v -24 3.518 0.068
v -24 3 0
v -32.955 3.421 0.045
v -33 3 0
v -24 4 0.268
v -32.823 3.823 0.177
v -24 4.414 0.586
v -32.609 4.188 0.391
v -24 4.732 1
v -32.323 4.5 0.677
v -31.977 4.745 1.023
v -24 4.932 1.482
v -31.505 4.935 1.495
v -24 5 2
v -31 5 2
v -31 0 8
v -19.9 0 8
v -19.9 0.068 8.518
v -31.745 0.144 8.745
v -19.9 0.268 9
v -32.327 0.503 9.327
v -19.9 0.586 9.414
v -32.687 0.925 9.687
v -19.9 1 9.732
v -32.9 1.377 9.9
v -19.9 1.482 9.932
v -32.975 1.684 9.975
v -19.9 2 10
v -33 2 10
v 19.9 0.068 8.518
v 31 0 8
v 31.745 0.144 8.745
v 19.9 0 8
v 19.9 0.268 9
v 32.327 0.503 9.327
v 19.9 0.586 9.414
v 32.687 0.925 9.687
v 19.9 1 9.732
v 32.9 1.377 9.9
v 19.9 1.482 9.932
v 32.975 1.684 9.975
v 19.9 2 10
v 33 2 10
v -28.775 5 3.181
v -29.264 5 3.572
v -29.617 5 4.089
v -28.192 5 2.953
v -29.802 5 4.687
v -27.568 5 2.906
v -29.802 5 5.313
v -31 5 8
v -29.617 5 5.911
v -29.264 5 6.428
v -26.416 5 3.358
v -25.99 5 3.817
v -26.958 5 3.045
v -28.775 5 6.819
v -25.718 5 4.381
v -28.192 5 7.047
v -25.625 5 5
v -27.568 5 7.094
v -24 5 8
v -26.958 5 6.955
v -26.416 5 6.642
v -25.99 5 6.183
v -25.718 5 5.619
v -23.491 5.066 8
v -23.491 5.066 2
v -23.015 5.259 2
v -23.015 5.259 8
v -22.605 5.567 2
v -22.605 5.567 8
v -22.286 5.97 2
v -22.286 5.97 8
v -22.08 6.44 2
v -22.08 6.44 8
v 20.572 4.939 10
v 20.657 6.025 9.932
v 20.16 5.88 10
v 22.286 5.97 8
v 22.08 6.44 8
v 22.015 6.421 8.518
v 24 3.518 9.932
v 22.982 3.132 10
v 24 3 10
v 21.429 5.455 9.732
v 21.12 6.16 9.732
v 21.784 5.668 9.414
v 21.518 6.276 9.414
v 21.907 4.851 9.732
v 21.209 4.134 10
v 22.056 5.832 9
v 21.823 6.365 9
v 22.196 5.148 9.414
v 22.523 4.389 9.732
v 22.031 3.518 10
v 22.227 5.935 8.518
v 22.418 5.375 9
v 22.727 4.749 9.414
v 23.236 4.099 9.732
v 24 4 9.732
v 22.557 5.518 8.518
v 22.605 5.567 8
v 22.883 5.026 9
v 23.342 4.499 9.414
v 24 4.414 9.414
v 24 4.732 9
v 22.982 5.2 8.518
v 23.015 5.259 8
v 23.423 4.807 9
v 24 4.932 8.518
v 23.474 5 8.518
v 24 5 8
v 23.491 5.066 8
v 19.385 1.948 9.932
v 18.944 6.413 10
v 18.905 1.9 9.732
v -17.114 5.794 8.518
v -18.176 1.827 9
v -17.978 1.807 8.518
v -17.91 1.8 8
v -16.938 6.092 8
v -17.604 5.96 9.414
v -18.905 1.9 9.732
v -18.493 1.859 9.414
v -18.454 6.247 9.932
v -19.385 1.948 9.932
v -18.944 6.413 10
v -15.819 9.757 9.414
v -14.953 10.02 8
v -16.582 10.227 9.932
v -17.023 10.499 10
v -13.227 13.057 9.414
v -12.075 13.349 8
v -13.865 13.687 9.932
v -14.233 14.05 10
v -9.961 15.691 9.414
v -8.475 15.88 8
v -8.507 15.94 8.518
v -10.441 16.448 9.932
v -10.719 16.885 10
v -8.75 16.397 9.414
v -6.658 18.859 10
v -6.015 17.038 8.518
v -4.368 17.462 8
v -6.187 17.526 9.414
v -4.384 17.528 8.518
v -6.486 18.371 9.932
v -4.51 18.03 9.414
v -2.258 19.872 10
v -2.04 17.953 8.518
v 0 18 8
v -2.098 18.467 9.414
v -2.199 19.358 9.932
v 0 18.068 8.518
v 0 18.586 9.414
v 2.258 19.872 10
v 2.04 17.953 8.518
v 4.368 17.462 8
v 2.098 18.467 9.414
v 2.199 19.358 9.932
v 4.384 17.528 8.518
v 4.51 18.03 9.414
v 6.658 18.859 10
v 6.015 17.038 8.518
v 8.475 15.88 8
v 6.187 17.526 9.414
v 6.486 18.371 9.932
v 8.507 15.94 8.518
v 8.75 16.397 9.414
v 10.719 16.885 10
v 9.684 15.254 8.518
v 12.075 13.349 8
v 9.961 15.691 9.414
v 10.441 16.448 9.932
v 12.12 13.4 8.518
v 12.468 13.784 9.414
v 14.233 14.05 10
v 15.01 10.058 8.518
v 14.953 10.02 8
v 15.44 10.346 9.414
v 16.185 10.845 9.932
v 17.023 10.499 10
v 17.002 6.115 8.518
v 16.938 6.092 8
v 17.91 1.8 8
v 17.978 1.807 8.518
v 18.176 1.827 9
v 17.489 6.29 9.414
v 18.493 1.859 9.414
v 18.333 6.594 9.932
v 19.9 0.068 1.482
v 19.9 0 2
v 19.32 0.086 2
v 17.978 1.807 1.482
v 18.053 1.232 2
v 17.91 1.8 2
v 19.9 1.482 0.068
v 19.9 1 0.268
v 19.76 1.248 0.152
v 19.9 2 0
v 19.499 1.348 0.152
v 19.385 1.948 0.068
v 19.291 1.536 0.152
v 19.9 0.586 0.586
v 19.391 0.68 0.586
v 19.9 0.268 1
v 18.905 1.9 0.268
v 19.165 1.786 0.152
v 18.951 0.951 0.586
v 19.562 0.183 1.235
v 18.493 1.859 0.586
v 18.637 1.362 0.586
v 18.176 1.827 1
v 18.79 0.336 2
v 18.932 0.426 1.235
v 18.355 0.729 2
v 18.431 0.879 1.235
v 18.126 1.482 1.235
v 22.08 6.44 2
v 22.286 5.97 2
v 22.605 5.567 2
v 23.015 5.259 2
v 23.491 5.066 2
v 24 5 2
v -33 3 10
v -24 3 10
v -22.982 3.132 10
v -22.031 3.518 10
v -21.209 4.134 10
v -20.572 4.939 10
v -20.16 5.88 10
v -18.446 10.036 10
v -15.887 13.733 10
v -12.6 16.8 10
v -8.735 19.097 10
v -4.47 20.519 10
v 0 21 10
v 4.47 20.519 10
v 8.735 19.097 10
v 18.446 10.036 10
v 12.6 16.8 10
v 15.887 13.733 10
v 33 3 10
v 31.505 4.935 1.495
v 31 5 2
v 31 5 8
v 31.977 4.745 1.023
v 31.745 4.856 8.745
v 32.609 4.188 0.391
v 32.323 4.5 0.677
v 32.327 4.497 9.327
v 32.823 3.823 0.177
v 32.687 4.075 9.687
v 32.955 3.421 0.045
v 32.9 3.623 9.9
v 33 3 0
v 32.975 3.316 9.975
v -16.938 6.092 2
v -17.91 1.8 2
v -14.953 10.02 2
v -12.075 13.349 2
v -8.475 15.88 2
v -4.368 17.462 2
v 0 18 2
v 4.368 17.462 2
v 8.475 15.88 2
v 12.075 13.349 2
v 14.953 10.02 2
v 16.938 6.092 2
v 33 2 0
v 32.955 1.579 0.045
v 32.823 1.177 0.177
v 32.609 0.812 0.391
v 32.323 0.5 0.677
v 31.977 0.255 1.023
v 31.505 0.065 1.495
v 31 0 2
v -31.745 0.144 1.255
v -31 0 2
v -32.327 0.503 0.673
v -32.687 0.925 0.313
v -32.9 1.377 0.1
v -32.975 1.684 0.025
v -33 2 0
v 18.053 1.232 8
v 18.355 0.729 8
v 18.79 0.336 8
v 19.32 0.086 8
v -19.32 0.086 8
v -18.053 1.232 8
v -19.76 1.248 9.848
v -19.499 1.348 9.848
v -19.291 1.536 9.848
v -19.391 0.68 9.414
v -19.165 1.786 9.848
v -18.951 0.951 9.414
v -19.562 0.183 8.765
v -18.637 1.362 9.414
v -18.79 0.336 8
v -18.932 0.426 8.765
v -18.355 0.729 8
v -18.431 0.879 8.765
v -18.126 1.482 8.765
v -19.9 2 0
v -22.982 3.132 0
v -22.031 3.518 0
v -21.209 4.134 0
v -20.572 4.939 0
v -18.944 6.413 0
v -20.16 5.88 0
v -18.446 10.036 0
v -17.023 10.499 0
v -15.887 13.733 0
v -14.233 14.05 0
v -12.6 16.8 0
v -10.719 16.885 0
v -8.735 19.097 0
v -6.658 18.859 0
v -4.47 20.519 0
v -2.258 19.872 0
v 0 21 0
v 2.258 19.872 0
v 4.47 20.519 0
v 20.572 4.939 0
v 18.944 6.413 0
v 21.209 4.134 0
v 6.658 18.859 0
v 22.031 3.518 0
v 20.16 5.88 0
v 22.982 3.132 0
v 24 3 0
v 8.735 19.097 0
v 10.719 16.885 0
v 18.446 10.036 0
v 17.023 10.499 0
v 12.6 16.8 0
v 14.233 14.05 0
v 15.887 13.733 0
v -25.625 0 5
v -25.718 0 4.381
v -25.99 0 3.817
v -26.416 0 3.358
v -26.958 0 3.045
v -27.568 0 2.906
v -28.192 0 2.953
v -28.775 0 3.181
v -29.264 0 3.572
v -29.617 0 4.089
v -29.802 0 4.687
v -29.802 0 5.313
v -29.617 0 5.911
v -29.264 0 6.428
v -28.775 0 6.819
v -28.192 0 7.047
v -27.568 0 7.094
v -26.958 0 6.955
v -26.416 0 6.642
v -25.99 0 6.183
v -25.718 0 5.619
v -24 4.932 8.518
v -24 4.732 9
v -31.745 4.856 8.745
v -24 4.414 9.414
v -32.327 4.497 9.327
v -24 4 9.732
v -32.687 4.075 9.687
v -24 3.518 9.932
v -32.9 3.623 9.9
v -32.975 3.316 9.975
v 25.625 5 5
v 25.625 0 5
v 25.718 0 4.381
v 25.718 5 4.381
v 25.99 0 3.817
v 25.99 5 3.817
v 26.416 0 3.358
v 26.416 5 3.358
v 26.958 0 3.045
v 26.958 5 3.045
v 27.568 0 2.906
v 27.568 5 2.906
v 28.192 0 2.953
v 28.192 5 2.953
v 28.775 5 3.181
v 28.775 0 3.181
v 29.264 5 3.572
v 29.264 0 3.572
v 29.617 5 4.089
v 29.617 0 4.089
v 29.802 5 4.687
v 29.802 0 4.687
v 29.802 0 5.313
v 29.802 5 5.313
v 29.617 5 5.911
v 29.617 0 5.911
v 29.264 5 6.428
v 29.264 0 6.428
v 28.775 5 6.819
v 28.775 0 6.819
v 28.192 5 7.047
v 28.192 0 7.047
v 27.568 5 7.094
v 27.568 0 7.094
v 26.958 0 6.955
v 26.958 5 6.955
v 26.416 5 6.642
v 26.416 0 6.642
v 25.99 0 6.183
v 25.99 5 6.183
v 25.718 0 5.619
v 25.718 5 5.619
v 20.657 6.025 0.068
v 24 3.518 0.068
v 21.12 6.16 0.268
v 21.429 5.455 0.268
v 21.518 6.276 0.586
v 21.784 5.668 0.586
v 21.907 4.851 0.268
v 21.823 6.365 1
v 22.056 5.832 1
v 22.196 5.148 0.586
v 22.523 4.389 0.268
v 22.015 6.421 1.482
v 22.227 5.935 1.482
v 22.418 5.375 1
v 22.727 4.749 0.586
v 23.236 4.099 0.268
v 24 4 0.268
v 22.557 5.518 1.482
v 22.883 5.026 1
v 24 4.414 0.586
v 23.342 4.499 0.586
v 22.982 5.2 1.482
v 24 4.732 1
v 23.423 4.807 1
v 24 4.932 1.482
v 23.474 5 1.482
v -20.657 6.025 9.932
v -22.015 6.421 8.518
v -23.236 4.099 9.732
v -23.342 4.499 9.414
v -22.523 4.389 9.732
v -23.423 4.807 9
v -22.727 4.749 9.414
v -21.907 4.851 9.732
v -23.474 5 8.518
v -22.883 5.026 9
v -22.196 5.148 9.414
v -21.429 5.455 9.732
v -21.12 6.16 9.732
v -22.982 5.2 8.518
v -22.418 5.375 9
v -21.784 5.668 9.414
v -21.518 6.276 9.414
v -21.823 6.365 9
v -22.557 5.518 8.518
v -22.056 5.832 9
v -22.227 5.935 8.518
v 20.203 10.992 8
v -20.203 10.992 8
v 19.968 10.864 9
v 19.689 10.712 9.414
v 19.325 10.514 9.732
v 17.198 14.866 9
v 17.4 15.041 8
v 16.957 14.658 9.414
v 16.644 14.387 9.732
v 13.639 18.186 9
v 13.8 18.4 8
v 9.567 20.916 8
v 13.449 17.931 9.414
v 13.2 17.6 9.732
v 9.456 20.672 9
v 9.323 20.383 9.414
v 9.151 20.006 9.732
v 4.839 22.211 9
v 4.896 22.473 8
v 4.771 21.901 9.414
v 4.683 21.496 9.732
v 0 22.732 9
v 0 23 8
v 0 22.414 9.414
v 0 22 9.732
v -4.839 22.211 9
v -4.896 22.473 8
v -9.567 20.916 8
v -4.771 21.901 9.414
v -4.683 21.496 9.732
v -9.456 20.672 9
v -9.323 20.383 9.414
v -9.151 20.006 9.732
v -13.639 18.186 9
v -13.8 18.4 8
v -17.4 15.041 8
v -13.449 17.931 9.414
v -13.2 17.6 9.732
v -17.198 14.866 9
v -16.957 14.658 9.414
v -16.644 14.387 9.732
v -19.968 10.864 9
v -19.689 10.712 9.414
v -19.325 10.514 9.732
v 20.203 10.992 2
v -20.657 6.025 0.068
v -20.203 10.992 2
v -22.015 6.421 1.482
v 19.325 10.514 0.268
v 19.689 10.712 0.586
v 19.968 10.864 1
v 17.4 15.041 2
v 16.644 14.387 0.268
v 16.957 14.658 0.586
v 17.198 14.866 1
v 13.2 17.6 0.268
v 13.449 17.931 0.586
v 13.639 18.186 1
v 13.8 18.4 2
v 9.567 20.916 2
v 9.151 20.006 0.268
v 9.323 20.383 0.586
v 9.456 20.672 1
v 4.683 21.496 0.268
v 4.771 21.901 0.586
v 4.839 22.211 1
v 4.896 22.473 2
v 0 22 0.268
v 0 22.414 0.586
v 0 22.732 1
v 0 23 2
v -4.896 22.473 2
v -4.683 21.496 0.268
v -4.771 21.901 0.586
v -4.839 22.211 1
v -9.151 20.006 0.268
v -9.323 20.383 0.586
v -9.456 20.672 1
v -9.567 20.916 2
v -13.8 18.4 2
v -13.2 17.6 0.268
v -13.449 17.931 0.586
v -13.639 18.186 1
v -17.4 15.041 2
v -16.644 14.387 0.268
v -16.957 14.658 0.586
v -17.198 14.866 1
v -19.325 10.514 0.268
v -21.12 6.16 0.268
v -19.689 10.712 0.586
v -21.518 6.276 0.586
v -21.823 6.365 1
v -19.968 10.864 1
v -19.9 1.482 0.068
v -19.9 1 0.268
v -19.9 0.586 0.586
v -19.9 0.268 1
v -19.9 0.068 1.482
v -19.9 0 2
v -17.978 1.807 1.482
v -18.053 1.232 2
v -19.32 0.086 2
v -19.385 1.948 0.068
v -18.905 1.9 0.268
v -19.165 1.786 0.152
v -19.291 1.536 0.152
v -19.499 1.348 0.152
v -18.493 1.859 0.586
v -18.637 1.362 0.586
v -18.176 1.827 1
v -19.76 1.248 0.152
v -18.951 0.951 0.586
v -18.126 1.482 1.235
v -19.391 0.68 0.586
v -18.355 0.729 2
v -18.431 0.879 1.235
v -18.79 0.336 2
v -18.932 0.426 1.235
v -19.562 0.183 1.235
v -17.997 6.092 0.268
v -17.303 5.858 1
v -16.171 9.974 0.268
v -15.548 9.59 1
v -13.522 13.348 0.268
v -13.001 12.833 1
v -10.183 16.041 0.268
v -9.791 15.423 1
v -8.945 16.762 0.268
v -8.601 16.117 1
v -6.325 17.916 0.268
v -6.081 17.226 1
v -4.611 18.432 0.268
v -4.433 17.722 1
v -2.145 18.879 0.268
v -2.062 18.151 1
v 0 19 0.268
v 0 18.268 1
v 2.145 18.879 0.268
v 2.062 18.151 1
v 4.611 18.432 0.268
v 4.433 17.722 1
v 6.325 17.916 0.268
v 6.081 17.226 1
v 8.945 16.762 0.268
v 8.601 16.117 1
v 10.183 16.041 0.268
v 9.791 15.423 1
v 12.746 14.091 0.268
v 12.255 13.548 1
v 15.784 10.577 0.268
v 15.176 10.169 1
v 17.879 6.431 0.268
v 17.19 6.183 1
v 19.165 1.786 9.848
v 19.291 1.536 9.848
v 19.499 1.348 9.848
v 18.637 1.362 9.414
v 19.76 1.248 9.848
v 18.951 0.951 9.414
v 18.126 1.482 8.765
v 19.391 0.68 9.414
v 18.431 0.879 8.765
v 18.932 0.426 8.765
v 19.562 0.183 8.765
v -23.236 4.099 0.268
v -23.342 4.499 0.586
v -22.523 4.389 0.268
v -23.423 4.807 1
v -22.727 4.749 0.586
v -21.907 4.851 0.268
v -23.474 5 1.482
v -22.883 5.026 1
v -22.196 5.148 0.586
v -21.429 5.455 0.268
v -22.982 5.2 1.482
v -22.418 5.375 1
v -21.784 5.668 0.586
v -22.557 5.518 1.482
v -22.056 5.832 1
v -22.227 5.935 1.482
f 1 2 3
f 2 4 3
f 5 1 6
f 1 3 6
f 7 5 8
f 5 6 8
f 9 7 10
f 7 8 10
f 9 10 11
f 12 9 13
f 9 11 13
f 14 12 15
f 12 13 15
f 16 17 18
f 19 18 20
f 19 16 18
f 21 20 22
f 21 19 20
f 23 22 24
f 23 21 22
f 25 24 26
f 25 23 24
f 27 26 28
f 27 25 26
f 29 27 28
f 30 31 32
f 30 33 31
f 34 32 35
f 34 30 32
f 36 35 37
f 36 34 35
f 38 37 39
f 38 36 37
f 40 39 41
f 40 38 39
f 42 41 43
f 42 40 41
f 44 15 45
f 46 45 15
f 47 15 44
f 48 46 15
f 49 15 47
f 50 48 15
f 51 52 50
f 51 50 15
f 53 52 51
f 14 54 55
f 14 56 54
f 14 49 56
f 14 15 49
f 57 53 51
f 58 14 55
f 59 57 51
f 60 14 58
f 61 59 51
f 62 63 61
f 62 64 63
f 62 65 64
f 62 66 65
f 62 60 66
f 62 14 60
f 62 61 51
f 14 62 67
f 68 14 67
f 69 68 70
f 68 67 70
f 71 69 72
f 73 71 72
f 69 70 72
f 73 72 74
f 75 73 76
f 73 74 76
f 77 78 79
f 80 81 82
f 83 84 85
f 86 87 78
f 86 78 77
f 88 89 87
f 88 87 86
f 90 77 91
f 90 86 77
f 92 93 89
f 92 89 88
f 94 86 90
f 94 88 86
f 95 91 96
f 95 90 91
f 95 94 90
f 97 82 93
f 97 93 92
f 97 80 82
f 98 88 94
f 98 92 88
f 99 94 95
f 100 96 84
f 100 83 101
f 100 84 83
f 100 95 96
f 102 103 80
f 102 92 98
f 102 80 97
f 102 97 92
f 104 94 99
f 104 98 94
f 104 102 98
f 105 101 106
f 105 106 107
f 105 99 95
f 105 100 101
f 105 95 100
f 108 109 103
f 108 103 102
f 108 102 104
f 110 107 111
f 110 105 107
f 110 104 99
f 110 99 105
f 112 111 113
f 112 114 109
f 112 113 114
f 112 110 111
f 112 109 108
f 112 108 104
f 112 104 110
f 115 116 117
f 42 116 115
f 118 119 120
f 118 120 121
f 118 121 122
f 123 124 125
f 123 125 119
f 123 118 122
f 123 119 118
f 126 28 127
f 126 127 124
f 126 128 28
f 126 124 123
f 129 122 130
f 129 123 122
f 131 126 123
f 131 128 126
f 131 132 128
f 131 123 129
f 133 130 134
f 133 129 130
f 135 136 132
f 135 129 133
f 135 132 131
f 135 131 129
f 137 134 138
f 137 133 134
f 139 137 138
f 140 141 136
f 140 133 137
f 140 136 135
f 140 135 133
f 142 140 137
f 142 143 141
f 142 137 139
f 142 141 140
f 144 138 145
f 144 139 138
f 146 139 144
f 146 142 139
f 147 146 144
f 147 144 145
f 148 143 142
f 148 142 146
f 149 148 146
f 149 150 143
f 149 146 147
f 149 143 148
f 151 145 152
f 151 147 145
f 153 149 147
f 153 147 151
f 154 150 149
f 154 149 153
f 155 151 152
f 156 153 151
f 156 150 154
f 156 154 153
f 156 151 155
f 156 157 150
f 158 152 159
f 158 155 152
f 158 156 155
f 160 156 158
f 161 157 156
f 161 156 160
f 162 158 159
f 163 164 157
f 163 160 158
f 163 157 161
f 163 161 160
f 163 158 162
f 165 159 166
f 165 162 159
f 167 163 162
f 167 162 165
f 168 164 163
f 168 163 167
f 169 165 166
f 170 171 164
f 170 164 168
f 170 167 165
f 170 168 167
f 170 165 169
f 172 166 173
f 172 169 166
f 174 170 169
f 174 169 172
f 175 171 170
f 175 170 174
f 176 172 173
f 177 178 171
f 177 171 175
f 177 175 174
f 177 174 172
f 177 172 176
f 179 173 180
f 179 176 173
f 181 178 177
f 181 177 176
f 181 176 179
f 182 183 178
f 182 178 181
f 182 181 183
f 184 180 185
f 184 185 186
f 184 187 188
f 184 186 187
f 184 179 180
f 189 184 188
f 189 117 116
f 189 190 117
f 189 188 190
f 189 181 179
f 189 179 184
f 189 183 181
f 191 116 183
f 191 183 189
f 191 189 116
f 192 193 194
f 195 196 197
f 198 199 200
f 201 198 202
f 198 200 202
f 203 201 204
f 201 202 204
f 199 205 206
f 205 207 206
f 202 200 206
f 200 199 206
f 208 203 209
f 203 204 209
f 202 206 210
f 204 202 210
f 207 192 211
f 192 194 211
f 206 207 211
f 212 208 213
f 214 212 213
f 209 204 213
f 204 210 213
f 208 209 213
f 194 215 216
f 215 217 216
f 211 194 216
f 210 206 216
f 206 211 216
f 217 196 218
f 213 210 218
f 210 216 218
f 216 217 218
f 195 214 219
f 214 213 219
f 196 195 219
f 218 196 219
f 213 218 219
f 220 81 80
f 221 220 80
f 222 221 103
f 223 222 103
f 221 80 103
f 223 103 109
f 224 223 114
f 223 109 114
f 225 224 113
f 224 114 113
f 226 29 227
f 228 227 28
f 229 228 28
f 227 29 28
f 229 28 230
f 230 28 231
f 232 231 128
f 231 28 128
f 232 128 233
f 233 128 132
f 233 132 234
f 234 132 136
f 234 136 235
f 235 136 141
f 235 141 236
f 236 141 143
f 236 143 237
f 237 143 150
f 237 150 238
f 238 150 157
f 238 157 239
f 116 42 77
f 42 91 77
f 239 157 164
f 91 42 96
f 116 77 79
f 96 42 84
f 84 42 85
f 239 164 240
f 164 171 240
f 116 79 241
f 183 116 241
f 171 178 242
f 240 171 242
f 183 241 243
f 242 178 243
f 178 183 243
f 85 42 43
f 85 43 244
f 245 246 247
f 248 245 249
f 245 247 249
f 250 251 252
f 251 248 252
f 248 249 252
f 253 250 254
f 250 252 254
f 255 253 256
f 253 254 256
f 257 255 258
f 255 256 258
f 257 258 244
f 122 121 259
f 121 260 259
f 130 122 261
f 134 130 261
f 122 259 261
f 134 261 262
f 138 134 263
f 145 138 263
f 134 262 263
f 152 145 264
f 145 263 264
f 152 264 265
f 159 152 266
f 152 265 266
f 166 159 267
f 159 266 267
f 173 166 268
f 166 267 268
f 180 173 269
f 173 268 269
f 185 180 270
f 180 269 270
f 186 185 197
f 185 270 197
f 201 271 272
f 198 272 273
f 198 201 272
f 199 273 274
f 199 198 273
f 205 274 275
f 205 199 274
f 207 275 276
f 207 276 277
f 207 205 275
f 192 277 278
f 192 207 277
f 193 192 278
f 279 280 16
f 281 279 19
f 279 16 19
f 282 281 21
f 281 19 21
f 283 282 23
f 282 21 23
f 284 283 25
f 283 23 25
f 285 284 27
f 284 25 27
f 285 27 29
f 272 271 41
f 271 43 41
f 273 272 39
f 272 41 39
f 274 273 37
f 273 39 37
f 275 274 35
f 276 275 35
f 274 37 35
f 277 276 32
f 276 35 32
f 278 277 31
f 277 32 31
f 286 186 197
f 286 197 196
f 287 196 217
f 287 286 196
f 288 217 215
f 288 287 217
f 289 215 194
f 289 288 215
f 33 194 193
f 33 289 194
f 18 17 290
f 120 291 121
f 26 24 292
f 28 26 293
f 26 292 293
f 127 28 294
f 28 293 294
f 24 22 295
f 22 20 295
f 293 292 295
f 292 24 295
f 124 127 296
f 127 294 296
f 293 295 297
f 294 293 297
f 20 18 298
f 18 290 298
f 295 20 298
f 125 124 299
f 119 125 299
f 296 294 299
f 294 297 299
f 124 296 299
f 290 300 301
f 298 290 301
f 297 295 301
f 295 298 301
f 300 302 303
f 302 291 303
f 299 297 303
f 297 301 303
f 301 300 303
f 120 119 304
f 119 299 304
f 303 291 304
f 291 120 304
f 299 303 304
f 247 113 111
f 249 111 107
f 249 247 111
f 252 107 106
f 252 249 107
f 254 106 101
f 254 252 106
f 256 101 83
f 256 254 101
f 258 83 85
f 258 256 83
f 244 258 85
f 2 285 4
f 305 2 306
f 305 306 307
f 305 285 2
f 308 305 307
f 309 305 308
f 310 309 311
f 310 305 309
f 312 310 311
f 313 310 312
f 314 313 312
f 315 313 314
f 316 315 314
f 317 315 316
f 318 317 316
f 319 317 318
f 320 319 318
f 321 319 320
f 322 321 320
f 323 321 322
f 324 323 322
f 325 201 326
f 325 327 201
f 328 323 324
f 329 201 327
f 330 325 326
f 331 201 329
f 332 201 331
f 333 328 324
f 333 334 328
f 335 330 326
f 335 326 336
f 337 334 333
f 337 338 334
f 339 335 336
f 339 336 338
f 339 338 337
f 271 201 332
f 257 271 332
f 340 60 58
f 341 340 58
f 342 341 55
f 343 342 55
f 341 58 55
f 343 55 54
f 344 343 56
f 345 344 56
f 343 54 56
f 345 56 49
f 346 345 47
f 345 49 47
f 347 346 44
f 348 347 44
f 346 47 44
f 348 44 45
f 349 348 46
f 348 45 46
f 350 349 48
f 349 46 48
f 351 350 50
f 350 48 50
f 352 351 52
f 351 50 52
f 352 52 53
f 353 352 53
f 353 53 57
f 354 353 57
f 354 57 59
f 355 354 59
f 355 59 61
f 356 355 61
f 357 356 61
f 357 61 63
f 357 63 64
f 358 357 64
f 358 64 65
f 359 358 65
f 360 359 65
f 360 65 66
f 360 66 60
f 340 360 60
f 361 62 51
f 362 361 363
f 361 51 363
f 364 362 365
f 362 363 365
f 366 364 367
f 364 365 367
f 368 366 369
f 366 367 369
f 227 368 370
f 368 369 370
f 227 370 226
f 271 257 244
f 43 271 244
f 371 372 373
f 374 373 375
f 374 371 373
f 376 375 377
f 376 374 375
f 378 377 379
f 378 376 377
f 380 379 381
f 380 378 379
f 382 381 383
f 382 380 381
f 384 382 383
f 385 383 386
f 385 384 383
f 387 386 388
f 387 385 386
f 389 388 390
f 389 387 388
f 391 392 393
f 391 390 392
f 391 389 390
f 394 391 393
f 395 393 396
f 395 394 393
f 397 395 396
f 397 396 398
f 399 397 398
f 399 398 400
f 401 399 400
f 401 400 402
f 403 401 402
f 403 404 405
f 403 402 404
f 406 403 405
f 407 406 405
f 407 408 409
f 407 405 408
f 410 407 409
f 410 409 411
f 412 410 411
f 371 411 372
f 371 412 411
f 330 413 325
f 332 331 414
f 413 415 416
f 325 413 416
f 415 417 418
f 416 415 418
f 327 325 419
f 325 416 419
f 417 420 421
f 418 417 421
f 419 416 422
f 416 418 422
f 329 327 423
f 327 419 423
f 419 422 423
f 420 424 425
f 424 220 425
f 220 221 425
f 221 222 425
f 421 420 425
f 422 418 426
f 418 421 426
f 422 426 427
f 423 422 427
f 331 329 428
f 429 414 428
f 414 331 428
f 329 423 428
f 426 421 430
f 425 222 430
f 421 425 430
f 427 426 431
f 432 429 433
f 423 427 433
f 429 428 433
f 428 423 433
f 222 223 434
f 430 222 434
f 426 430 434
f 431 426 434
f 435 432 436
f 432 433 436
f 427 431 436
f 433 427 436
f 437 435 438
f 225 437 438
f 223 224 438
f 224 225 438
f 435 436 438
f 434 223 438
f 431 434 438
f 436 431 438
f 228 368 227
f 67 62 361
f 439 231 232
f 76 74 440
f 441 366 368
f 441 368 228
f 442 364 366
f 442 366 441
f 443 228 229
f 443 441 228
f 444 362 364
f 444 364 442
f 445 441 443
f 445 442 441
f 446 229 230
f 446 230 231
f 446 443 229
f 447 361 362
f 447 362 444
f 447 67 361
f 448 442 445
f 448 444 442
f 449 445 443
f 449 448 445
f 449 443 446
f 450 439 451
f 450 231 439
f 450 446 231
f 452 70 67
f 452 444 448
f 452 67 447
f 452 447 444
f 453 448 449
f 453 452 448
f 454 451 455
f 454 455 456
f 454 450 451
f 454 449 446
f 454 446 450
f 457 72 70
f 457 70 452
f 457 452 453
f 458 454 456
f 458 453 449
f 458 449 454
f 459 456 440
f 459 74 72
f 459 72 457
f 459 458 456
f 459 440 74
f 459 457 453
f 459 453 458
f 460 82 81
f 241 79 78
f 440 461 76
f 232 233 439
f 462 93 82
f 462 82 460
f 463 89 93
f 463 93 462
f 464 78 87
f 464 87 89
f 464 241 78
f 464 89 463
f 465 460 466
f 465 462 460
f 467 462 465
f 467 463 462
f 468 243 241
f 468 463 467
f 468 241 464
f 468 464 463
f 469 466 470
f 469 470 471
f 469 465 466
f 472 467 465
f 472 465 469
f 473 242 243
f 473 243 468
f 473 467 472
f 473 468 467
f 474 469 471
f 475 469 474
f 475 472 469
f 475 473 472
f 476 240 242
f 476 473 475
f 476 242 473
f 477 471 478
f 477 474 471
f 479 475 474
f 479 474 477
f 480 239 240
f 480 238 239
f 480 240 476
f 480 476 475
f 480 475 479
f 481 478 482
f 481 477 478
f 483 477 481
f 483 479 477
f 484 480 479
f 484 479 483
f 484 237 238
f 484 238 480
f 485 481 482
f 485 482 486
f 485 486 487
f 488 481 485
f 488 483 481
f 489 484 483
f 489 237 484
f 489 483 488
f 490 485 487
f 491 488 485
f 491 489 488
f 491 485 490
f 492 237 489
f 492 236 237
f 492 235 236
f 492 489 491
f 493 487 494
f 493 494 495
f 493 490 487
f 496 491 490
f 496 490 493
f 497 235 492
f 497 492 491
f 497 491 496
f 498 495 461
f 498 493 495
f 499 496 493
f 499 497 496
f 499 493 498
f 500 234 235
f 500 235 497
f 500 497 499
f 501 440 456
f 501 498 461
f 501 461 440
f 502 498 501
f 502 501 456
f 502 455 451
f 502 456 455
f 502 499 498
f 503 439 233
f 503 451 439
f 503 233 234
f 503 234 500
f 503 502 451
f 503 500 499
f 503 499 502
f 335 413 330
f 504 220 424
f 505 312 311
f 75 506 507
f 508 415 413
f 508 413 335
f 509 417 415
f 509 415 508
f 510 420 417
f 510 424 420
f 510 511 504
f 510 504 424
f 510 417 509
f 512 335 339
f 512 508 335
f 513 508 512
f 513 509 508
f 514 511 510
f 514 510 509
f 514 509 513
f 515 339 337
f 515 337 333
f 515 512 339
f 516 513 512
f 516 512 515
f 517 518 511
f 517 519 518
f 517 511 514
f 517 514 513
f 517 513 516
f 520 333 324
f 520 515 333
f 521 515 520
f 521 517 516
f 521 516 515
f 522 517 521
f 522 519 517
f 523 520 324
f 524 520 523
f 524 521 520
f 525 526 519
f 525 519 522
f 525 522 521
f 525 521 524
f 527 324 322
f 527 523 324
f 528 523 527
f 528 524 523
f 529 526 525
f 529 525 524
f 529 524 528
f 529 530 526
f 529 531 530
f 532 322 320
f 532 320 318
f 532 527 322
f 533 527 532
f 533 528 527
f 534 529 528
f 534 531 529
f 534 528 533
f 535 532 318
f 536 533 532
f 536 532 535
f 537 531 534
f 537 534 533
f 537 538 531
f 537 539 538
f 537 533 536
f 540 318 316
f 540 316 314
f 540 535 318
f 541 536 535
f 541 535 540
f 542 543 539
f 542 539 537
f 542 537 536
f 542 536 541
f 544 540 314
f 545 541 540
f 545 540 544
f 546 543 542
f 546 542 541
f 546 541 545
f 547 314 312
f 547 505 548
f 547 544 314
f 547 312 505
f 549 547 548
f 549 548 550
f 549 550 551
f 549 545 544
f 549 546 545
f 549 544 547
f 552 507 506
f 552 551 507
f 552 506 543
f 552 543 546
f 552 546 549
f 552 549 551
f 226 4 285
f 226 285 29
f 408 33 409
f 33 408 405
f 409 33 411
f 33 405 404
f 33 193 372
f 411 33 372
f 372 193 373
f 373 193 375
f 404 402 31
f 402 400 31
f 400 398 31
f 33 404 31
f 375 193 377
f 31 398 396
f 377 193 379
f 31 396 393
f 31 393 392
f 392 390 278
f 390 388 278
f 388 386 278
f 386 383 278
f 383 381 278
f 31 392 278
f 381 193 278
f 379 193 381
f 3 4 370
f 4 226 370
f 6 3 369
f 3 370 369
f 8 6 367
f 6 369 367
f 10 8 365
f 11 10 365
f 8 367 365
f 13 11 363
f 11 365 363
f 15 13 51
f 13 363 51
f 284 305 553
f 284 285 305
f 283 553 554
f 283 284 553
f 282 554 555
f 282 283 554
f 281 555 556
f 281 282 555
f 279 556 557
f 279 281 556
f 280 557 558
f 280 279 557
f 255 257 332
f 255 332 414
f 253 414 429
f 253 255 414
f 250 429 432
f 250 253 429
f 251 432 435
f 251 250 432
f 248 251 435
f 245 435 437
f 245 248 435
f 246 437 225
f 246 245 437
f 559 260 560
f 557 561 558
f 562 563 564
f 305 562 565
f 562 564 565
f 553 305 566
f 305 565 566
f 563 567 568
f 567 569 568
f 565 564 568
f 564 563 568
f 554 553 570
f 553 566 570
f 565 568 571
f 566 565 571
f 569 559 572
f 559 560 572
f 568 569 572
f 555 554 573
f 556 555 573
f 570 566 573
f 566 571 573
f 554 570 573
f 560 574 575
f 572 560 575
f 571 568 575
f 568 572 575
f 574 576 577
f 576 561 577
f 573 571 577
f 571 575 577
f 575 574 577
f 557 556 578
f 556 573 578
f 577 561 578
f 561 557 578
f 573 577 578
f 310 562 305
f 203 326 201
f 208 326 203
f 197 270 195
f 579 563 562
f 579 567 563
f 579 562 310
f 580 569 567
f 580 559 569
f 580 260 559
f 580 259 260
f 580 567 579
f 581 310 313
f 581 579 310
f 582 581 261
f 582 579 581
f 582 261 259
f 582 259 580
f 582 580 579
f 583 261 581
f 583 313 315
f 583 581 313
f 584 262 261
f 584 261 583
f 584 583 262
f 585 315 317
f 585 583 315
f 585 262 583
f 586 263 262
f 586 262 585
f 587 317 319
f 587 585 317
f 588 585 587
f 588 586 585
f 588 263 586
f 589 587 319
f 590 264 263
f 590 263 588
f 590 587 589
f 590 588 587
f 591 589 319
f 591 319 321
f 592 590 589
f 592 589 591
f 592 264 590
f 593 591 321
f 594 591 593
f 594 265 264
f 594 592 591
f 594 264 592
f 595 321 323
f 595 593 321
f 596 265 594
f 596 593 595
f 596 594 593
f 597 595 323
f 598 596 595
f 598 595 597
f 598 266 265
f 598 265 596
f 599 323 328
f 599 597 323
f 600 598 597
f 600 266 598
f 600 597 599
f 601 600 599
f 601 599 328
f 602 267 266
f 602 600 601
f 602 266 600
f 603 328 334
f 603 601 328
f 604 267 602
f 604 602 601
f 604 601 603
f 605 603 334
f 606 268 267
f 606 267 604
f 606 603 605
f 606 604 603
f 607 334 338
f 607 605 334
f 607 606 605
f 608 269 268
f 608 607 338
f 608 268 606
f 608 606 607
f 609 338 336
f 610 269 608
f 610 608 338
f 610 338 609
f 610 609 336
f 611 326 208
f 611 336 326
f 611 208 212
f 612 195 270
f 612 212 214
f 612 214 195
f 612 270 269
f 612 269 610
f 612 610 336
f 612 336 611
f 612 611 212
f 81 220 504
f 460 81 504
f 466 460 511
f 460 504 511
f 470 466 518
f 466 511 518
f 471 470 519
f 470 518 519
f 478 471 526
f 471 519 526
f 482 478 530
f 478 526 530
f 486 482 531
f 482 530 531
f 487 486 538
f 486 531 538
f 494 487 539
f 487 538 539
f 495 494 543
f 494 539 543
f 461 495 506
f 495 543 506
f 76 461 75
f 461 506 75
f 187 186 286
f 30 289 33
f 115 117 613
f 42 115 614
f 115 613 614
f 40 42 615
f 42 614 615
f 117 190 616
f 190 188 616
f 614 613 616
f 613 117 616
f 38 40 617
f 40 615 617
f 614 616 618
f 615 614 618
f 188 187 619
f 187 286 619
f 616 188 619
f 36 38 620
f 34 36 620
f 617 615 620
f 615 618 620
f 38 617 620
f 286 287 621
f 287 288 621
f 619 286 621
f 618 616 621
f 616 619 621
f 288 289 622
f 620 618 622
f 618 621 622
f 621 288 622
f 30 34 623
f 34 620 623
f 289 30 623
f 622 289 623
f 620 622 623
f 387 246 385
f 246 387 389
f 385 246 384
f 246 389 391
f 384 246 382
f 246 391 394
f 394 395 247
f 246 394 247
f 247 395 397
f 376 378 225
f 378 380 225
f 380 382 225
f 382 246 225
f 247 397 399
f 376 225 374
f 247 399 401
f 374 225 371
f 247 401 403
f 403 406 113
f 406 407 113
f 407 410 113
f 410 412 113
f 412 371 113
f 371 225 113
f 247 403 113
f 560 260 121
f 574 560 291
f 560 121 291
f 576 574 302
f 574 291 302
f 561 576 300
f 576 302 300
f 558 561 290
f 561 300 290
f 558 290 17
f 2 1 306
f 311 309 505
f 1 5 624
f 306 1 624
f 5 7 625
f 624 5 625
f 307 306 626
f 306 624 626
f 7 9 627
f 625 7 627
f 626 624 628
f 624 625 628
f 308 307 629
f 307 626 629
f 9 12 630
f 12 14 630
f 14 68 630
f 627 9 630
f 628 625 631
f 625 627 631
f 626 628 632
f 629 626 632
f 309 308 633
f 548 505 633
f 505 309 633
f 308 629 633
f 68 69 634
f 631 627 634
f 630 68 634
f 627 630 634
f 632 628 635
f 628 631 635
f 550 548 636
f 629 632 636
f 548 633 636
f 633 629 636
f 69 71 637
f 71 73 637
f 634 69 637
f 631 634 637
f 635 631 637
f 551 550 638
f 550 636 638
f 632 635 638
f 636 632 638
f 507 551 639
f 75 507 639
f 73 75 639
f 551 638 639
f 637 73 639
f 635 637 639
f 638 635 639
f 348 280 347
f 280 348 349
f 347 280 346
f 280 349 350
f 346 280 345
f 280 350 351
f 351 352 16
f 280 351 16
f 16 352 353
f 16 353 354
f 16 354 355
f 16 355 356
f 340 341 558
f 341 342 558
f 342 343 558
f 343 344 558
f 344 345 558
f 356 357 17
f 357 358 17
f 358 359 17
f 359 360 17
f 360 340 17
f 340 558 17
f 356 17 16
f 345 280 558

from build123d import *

# Parameters (mm, degrees)
BOSS_EXTRUDE1_DEPTH = 10
BOSS_EXTRUDE2_START = -0.550056
SKETCH2_W           = 10
SKETCH2_H           = 5
BOSS_EXTRUDE2_DEPTH = 10.550056
SKETCH3_R           = 2.1
CUT_EXTRUDE1_DEPTH  = 10
FILLET1_R           = 2


with BuildPart() as part:
    # Sketch1 → Boss-Extrude1 (new body)
    with BuildSketch(Plane.XY):
        with BuildLine():
            Line((-23, 0), (-18, 0))
            ThreePointArc((-18, 0), (0, 18), (18, 0))
            Line((18, 0), (23, 0))
            ThreePointArc((23, 0), (0, 23), (-23, 0))
        make_face()
    extrude(amount=BOSS_EXTRUDE1_DEPTH)

    # Sketch2 → Boss-Extrude2 (add)
    with BuildSketch(Plane.ZY.offset(23).offset(BOSS_EXTRUDE2_START)):
        with Locations((5, 2.5)):
            Rectangle(SKETCH2_W, SKETCH2_H)
    boss_extrude2 = extrude(amount=BOSS_EXTRUDE2_DEPTH)

    # Sketch3 → Cut-Extrude1 (cut)
    with BuildSketch(Plane(origin=(0, 5, 0), x_dir=(1, 0, 0), z_dir=(0, 1, 0))):
        with Locations((-27.72497216, -5)):
            Circle(SKETCH3_R)
    cut_extrude1 = extrude(amount=-CUT_EXTRUDE1_DEPTH, mode=Mode.SUBTRACT)

    # Mirror1: Boss-Extrude2, Cut-Extrude1 across plane
    add(boss_extrude2.mirror(Plane(origin=(0, 0, 0), x_dir=(0, 0, 1), z_dir=(1, 0, 0))))
    add(cut_extrude1.mirror(Plane(origin=(0, 0, 0), x_dir=(0, 0, 1), z_dir=(1, 0, 0))), mode=Mode.SUBTRACT)

    # Fillet1
    fillet1_edges = [part.edges().sort_by_distance(p)[0] for p in [
        (0, 18, 10),
        (-22.449944, 5, 5),
        (-27.724972, 5, 0),
        (-27.724972, 5, 10),
        (-33, 5, 5),
        (-33, 0, 5),
        (25.5, 0, 10),
        (0, 23, 0),
        (0, 23, 10),
        (27.724972, 5, 0),
        (27.724972, 5, 10),
        (33, 5, 5),
        (22.449944, 5, 5),
        (33, 0, 5),
        (25.5, 0, 0),
        (0, 18, 0),
        (-25.5, 0, 0),
        (18, 0, 5),
        (-18, 0, 5),
        (-25.5, 0, 10),
    ]]
    fillet(fillet1_edges, radius=FILLET1_R)


solid = part.part
